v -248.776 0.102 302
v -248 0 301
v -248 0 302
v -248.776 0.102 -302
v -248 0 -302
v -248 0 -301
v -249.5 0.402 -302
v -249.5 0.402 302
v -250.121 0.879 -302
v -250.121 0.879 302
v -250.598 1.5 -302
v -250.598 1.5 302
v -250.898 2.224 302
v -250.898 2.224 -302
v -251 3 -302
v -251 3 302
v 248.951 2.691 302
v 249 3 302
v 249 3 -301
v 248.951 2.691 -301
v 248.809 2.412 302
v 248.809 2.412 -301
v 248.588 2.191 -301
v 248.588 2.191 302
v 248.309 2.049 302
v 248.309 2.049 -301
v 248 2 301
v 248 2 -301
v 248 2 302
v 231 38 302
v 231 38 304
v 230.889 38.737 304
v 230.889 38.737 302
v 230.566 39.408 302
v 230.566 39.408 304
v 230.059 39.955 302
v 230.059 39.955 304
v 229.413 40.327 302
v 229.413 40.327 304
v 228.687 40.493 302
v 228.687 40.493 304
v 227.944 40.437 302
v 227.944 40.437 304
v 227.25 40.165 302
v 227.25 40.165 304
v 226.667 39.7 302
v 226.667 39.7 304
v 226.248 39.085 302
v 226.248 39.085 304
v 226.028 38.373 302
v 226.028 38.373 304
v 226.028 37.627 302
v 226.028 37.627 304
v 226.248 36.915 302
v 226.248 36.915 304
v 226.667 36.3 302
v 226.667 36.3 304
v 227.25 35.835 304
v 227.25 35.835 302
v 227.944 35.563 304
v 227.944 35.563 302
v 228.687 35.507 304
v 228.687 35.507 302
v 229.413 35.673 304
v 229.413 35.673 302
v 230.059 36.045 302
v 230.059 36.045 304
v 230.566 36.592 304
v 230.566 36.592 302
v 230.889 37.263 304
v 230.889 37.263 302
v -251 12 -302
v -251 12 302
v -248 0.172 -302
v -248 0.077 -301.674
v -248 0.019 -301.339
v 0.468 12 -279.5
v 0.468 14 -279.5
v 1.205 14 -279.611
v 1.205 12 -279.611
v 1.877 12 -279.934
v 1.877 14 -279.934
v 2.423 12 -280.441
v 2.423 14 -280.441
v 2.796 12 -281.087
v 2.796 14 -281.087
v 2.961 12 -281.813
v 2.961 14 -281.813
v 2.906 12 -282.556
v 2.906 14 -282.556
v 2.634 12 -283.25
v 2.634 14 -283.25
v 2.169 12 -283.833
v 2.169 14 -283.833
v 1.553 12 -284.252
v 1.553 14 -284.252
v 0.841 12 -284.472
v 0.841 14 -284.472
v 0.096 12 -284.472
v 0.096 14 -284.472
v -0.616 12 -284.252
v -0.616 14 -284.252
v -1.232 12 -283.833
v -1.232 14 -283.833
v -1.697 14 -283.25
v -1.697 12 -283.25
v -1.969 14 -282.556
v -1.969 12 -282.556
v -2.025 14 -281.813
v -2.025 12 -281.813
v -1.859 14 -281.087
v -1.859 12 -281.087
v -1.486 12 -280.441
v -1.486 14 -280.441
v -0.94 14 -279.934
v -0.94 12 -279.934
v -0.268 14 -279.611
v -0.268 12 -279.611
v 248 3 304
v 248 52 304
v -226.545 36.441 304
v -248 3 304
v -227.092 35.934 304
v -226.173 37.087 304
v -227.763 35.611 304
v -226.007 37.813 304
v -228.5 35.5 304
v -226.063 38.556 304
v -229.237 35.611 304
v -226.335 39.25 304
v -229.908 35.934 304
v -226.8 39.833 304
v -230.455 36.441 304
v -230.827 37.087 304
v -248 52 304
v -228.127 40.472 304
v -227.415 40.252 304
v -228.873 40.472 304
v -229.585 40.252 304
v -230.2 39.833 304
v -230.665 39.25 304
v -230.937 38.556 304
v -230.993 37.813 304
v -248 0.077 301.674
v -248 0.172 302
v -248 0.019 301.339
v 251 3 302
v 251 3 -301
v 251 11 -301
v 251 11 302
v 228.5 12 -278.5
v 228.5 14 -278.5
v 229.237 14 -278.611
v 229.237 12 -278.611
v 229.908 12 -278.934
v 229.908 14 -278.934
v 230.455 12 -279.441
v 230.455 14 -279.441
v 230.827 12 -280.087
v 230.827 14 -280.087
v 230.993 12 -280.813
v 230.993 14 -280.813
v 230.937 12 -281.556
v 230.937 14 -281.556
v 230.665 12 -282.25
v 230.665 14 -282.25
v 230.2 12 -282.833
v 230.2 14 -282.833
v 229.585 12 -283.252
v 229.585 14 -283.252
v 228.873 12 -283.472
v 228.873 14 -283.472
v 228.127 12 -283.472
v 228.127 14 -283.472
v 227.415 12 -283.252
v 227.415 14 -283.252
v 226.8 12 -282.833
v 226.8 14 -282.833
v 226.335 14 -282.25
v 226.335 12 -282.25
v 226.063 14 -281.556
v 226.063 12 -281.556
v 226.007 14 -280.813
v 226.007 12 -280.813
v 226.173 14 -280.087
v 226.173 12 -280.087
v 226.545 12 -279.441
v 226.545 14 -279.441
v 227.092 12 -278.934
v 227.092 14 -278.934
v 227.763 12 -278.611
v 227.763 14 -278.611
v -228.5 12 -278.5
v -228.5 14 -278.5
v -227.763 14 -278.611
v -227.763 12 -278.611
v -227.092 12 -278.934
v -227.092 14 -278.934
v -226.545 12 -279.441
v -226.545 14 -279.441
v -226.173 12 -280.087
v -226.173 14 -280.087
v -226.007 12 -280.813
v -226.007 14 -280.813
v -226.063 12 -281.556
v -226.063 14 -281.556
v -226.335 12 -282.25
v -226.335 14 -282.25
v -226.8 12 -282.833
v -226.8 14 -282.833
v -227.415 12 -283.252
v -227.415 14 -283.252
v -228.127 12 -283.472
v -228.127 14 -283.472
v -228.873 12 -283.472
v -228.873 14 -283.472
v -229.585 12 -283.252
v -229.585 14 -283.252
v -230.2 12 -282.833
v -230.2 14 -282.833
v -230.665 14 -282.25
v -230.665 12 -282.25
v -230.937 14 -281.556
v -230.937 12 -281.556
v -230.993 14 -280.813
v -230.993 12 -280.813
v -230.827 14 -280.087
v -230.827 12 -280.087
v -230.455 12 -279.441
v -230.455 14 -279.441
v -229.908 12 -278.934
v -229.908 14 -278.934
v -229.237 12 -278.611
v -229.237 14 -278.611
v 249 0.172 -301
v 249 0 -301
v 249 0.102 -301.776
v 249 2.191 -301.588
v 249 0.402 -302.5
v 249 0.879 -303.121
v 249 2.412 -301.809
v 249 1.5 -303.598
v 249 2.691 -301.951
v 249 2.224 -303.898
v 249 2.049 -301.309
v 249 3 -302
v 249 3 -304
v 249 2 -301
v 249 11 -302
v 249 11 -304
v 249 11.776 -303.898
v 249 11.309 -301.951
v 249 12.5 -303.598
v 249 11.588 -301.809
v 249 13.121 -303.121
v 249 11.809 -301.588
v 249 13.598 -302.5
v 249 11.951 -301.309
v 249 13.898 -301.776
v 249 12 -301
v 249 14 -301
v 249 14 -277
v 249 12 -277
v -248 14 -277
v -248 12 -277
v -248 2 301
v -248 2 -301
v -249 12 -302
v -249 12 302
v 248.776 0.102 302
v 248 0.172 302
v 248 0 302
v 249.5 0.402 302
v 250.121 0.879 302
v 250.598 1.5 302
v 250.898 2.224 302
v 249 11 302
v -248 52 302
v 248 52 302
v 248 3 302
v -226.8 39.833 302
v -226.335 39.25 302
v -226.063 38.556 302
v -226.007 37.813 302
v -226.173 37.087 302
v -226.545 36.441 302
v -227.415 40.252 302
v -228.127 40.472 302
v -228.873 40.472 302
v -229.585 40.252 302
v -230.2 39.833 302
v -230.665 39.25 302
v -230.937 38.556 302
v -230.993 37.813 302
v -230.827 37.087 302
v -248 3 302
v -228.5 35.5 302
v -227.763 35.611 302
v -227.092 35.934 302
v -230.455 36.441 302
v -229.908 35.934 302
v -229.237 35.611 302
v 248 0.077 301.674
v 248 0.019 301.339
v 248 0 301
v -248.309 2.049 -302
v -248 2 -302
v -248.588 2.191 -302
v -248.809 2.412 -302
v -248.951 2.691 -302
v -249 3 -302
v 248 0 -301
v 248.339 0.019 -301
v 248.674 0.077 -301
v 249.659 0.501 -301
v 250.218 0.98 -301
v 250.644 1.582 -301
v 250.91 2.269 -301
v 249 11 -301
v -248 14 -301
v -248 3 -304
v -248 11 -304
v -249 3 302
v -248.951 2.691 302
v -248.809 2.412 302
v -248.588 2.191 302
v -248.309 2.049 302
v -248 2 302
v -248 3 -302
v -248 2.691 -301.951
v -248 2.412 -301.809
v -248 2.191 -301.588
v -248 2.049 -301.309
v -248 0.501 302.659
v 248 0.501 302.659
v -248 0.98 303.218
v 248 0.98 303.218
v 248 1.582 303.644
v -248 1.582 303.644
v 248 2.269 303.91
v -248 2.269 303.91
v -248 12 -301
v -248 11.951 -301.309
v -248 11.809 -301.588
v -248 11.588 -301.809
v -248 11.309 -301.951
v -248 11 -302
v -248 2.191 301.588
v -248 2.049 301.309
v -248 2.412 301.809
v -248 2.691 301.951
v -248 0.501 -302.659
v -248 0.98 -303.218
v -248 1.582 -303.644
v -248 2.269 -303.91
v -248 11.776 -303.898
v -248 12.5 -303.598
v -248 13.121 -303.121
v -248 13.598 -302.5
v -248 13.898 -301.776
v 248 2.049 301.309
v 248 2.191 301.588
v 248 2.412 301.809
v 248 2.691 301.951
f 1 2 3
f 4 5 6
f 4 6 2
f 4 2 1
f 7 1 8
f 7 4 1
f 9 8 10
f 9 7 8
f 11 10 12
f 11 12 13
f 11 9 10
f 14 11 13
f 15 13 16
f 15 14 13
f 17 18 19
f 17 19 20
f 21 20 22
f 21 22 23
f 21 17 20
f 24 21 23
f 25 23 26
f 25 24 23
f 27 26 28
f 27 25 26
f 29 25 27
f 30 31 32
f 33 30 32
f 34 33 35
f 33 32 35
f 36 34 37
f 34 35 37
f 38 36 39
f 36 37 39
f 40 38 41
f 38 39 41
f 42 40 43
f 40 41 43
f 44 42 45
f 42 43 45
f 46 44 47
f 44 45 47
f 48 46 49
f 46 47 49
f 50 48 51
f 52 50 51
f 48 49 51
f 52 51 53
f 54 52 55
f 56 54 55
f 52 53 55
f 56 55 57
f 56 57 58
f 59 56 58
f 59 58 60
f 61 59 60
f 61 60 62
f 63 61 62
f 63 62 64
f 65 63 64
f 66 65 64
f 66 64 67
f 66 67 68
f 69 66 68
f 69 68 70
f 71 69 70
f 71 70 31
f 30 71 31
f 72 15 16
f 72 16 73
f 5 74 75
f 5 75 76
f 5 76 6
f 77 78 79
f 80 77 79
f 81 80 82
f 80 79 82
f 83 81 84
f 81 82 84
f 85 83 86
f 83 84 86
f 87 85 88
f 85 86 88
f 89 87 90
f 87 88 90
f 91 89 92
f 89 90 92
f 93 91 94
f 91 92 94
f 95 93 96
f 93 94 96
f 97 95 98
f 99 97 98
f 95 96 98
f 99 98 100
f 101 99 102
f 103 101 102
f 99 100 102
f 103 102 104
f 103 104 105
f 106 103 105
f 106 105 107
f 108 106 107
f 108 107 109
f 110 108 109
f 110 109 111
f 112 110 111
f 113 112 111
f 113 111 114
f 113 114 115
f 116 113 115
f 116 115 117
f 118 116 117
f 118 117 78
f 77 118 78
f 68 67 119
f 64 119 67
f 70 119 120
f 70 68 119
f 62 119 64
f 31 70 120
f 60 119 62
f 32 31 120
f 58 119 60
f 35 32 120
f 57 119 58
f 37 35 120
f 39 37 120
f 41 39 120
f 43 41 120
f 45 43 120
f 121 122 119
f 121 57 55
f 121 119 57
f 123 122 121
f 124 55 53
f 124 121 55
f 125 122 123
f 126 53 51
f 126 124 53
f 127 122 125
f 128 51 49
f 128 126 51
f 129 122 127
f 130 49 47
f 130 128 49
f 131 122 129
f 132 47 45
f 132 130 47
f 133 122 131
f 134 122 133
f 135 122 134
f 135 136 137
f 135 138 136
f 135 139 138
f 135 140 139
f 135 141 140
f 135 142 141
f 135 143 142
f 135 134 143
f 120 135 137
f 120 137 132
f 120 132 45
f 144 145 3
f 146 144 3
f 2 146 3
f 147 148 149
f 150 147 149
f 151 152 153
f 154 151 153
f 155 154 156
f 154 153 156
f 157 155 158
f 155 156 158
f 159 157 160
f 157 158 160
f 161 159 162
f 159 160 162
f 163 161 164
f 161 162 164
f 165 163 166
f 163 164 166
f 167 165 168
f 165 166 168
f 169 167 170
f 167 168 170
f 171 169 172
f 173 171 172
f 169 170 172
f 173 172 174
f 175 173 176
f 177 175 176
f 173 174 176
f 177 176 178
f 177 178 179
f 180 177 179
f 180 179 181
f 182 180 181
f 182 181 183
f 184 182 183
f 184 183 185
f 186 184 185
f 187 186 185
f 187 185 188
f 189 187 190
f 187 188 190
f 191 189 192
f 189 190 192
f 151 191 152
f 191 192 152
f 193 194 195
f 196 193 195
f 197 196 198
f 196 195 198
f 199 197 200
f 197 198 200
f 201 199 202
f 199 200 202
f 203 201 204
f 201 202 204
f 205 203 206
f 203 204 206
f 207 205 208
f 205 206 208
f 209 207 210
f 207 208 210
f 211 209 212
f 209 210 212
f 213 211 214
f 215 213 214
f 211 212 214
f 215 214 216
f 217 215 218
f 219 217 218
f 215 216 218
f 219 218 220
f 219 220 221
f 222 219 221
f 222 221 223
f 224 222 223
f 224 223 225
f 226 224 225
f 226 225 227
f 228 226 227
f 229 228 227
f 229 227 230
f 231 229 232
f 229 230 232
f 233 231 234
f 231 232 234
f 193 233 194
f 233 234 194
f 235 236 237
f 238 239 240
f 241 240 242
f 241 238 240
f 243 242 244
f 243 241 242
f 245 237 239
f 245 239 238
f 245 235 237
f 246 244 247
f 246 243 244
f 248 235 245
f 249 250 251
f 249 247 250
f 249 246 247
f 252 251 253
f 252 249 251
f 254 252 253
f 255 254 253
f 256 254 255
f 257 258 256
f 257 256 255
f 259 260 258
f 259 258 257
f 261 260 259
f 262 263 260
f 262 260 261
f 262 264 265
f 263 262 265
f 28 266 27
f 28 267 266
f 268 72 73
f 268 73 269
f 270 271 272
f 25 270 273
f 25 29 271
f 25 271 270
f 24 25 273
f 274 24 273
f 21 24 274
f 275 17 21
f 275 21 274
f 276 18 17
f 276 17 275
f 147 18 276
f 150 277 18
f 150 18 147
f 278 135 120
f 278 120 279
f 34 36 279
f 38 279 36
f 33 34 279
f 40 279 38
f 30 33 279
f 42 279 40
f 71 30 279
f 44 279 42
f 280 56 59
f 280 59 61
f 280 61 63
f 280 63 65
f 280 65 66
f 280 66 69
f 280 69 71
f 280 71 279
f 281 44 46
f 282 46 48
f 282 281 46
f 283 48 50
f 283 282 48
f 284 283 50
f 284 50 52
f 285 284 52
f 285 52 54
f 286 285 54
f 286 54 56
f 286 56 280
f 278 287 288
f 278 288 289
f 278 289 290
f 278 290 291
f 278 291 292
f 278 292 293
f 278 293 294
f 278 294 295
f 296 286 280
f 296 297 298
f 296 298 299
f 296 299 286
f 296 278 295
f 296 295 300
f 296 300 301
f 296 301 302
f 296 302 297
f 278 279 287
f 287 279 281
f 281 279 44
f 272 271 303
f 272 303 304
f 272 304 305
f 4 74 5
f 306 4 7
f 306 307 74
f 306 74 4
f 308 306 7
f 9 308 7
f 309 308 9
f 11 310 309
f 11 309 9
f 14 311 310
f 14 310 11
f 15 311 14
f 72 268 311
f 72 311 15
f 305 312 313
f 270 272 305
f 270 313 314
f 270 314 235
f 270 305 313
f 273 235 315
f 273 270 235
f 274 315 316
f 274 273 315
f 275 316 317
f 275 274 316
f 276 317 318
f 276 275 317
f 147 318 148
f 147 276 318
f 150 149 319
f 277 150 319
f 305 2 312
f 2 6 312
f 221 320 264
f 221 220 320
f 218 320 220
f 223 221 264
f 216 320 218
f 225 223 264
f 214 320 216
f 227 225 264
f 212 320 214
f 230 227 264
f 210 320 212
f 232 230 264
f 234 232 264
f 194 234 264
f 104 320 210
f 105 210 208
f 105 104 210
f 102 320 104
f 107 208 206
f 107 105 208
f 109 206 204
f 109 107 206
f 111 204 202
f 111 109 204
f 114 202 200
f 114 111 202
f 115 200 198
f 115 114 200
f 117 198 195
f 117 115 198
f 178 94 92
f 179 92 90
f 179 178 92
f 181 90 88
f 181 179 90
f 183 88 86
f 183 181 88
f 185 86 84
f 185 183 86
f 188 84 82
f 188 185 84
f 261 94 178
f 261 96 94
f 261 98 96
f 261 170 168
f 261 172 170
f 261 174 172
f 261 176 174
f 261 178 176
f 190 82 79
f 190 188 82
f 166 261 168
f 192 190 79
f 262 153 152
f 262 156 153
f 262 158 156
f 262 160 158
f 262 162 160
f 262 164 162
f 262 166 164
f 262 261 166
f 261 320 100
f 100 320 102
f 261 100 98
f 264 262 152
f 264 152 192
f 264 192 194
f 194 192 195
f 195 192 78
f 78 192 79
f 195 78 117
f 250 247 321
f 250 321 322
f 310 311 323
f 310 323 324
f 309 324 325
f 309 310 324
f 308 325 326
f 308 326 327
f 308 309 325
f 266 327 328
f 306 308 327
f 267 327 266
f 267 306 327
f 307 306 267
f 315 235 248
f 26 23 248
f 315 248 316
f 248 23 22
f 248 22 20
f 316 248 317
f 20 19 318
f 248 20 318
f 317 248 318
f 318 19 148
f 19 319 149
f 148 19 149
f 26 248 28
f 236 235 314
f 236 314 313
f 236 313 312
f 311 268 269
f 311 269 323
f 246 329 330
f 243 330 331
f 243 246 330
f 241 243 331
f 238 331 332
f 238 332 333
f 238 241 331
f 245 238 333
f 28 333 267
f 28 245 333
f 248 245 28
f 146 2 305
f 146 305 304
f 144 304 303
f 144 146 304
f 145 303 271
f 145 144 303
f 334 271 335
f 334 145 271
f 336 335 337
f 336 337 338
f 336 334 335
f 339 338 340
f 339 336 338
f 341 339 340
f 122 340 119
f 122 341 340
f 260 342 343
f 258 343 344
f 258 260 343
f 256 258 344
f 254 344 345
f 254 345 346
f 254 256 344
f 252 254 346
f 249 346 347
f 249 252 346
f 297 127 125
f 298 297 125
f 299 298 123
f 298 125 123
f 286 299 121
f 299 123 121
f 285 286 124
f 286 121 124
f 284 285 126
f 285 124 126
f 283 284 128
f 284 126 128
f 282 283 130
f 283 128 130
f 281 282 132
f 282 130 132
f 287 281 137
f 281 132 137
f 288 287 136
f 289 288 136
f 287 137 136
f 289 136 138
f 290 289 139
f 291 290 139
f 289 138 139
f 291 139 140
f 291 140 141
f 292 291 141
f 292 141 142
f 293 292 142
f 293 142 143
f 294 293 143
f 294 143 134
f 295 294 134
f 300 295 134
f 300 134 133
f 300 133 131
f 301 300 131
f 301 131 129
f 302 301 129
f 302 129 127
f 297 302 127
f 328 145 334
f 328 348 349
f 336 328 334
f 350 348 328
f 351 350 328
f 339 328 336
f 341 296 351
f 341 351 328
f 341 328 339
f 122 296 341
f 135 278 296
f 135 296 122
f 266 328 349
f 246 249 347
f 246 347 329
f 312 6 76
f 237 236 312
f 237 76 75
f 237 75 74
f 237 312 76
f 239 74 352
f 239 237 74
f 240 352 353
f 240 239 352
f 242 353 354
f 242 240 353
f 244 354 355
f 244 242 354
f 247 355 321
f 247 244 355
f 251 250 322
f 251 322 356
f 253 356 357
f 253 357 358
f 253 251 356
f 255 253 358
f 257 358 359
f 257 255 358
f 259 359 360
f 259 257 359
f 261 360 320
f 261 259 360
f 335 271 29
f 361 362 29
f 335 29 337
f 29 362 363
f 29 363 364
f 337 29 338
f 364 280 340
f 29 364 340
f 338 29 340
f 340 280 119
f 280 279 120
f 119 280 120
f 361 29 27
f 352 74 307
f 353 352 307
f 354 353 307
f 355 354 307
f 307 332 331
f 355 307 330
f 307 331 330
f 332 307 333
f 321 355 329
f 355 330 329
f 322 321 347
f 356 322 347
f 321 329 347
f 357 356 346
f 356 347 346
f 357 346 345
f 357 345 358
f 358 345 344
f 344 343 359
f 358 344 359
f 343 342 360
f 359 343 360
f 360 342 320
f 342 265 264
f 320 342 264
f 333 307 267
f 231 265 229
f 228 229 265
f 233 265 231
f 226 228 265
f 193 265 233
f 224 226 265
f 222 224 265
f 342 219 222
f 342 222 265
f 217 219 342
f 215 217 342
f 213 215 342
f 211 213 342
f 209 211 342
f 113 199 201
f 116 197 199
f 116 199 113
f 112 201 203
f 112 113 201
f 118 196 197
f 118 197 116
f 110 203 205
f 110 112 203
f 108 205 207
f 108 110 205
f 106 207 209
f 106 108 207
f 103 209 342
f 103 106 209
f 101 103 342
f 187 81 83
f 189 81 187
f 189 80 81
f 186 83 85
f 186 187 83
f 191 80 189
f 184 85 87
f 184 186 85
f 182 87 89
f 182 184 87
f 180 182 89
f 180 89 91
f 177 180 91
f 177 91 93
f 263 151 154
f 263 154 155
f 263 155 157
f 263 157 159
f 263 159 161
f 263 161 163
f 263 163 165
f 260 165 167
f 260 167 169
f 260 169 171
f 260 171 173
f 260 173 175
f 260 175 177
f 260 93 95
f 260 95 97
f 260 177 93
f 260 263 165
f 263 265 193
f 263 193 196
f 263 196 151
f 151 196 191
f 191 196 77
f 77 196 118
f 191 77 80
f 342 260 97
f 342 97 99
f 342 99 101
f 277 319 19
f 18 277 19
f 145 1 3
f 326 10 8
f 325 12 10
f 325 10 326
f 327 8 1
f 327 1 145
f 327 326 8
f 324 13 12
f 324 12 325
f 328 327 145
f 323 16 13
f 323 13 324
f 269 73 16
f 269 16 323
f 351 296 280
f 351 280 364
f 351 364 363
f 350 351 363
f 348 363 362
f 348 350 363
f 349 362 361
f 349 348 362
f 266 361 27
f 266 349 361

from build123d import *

# Parameters (mm, degrees)
SKETCH1_W                    = 498
SKETCH1_H                    = 604
BASE_FLANGE1_DEPTH           = 2
EDGE_FLANGE1_STRIP_W         = 10
EDGE_FLANGE1_STRIP_H         = 2
EDGE_FLANGE1_STRIP_CUT_DEPTH = 604
EDGE_FLANGE1_DEPTH           = 604
EDGE_FLANGE4_STRIP_W         = 10
EDGE_FLANGE4_STRIP_H         = 2
EDGE_FLANGE4_STRIP_CUT_DEPTH = 497
EDGE_FLANGE4_DEPTH           = 497
EDGE_FLANGE5_STRIP_W         = 10
EDGE_FLANGE5_STRIP_H         = 2
EDGE_FLANGE5_STRIP_CUT_DEPTH = 497
EDGE_FLANGE5_DEPTH           = 497
EDGE_FLANGE6_STRIP_W         = 10
EDGE_FLANGE6_STRIP_H         = 2
EDGE_FLANGE6_STRIP_CUT_DEPTH = 603
EDGE_FLANGE6_DEPTH           = 603
EDGE_FLANGE7_STRIP_W         = 10
EDGE_FLANGE7_STRIP_H         = 2
EDGE_FLANGE7_STRIP_CUT_DEPTH = 496
EDGE_FLANGE7_DEPTH           = 496
SKETCH37_R                   = 2.5
CUT_EXTRUDE2_DEPTH           = 2
SKETCH38_R                   = 2.5
CUT_EXTRUDE3_DEPTH           = 660.824976793
SKETCH39_R                   = 2.5
CUT_EXTRUDE4_DEPTH           = 10


# Sheet-metal steps are written as plain solids
with BuildPart() as part:
    # Sketch1 → Base-Flange1 (new body)
    with BuildSketch(Plane(origin=(0, 0, 0), x_dir=(1, 0, 0), z_dir=(0, 1, 0))):
        Rectangle(SKETCH1_W, SKETCH1_H)
    extrude(amount=BASE_FLANGE1_DEPTH)

    # Edge-Flange1 strip (across the edge) → Edge-Flange1 strip cut (cut)
    with BuildSketch(Plane(origin=(-249, 2, -302), x_dir=(1, 0, 0), z_dir=(0, 0, 1))):
        with Locations((-4, -1)):
            Rectangle(EDGE_FLANGE1_STRIP_W, EDGE_FLANGE1_STRIP_H)
    extrude(amount=EDGE_FLANGE1_STRIP_CUT_DEPTH, mode=Mode.SUBTRACT)

    # Edge-Flange1 section (across the edge) → Edge-Flange1 (add)
    with BuildSketch(Plane(origin=(-249, 2, -302), x_dir=(1, 0, 0), z_dir=(0, 0, 1))):
        with BuildLine():
            Line((-2, 1), (-2, 10))
            Line((-2, 10), (0, 10))
            Line((0, 10), (0, 1))
            ThreePointArc((0, 1), (0.292893219, 0.292893219), (1, 0))
            Line((1, 0), (1, -2))
            ThreePointArc((1, -2), (-1.121320344, -1.121320344), (-2, 1))
        make_face()
    extrude(amount=EDGE_FLANGE1_DEPTH)

    # Edge-Flange4 strip (across the edge) → Edge-Flange4 strip cut (cut)
    with BuildSketch(Plane(origin=(249, 2, -302), x_dir=(0, 0, 1), z_dir=(-1, 0, 0))):
        with Locations((-4, -1)):
            Rectangle(EDGE_FLANGE4_STRIP_W, EDGE_FLANGE4_STRIP_H)
    extrude(amount=EDGE_FLANGE4_STRIP_CUT_DEPTH, mode=Mode.SUBTRACT)

    # Edge-Flange4 section (across the edge) → Edge-Flange4 (add)
    with BuildSketch(Plane(origin=(249, 2, -302), x_dir=(0, 0, 1), z_dir=(-1, 0, 0))):
        with BuildLine():
            Line((-2, 1), (-2, 10))
            Line((-2, 10), (0, 10))
            Line((0, 10), (0, 1))
            ThreePointArc((0, 1), (0.292893219, 0.292893219), (1, 0))
            Line((1, 0), (1, -2))
            ThreePointArc((1, -2), (-1.121320344, -1.121320344), (-2, 1))
        make_face()
    extrude(amount=EDGE_FLANGE4_DEPTH)

    # Edge-Flange5 strip (across the edge) → Edge-Flange5 strip cut (cut)
    with BuildSketch(Plane(origin=(249, 12, -302), x_dir=(0, -1, 0), z_dir=(-1, 0, 0))):
        with Locations((-4, -1)):
            Rectangle(EDGE_FLANGE5_STRIP_W, EDGE_FLANGE5_STRIP_H)
    extrude(amount=EDGE_FLANGE5_STRIP_CUT_DEPTH, mode=Mode.SUBTRACT)

    # Edge-Flange5 section (across the edge) → Edge-Flange5 (add)
    with BuildSketch(Plane(origin=(249, 12, -302), x_dir=(0, -1, 0), z_dir=(-1, 0, 0))):
        with BuildLine():
            Line((-2, 1), (-2, 25))
            Line((-2, 25), (0, 25))
            Line((0, 25), (0, 1))
            ThreePointArc((0, 1), (0.292893219, 0.292893219), (1, 0))
            Line((1, 0), (1, -2))
            ThreePointArc((1, -2), (-1.121320344, -1.121320344), (-2, 1))
        make_face()
    extrude(amount=EDGE_FLANGE5_DEPTH)

    # Edge-Flange6 strip (across the edge) → Edge-Flange6 strip cut (cut)
    with BuildSketch(Plane(origin=(249, 2, 302), x_dir=(-1, 0, 0), z_dir=(0, 0, -1))):
        with Locations((-4, -1)):
            Rectangle(EDGE_FLANGE6_STRIP_W, EDGE_FLANGE6_STRIP_H)
    extrude(amount=EDGE_FLANGE6_STRIP_CUT_DEPTH, mode=Mode.SUBTRACT)

    # Edge-Flange6 section (across the edge) → Edge-Flange6 (add)
    with BuildSketch(Plane(origin=(249, 2, 302), x_dir=(-1, 0, 0), z_dir=(0, 0, -1))):
        with BuildLine():
            Line((-2, 1), (-2, 9))
            Line((-2, 9), (0, 9))
            Line((0, 9), (0, 1))
            ThreePointArc((0, 1), (0.292893219, 0.292893219), (1, 0))
            Line((1, 0), (1, -2))
            ThreePointArc((1, -2), (-1.121320344, -1.121320344), (-2, 1))
        make_face()
    extrude(amount=EDGE_FLANGE6_DEPTH)

    # Edge-Flange7 strip (across the edge) → Edge-Flange7 strip cut (cut)
    with BuildSketch(Plane(origin=(-248, 2, 302), x_dir=(0, 0, -1), z_dir=(1, 0, 0))):
        with Locations((-4, -1)):
            Rectangle(EDGE_FLANGE7_STRIP_W, EDGE_FLANGE7_STRIP_H)
    extrude(amount=EDGE_FLANGE7_STRIP_CUT_DEPTH, mode=Mode.SUBTRACT)

    # Edge-Flange7 section (across the edge) → Edge-Flange7 (add)
    with BuildSketch(Plane(origin=(-248, 2, 302), x_dir=(0, 0, -1), z_dir=(1, 0, 0))):
        with BuildLine():
            Line((-2, 1), (-2, 50))
            Line((-2, 50), (0, 50))
            Line((0, 50), (0, 1))
            ThreePointArc((0, 1), (0.292893219, 0.292893219), (1, 0))
            Line((1, 0), (1, -2))
            ThreePointArc((1, -2), (-1.121320344, -1.121320344), (-2, 1))
        make_face()
    extrude(amount=EDGE_FLANGE7_DEPTH)

    # Sketch37 → Cut-Extrude2 (cut)
    with BuildSketch(Plane(origin=(0, 14, 0), x_dir=(1, 0, 0), z_dir=(0, 1, 0))):
        with Locations(Location((-228.5, 281, 0), (0, 0, 270))):
            Circle(SKETCH37_R)
        with Locations(Location((228.5, 281, 0), (0, 0, 270))):
            Circle(SKETCH37_R)
    extrude(amount=-CUT_EXTRUDE2_DEPTH, mode=Mode.SUBTRACT)

    # Sketch38 → Cut-Extrude3 (cut, through all)
    with BuildSketch(Plane.XY.offset(304)):
        with Locations((228.5, 38)):
            Circle(SKETCH38_R)
        with Locations(Location((-228.5, 38, 0), (0, 0, 270))):
            Circle(SKETCH38_R)
    extrude(amount=-CUT_EXTRUDE3_DEPTH, mode=Mode.SUBTRACT)

    # Sketch39 → Cut-Extrude4 (cut)
    with BuildSketch(Plane(origin=(0, 14, 0), x_dir=(1, 0, 0), z_dir=(0, 1, 0))):
        with Locations(Location((0.468438538, 282, 0), (0, 0, 270))):
            Circle(SKETCH39_R)
    extrude(amount=-CUT_EXTRUDE4_DEPTH, mode=Mode.SUBTRACT)


solid = part.part
